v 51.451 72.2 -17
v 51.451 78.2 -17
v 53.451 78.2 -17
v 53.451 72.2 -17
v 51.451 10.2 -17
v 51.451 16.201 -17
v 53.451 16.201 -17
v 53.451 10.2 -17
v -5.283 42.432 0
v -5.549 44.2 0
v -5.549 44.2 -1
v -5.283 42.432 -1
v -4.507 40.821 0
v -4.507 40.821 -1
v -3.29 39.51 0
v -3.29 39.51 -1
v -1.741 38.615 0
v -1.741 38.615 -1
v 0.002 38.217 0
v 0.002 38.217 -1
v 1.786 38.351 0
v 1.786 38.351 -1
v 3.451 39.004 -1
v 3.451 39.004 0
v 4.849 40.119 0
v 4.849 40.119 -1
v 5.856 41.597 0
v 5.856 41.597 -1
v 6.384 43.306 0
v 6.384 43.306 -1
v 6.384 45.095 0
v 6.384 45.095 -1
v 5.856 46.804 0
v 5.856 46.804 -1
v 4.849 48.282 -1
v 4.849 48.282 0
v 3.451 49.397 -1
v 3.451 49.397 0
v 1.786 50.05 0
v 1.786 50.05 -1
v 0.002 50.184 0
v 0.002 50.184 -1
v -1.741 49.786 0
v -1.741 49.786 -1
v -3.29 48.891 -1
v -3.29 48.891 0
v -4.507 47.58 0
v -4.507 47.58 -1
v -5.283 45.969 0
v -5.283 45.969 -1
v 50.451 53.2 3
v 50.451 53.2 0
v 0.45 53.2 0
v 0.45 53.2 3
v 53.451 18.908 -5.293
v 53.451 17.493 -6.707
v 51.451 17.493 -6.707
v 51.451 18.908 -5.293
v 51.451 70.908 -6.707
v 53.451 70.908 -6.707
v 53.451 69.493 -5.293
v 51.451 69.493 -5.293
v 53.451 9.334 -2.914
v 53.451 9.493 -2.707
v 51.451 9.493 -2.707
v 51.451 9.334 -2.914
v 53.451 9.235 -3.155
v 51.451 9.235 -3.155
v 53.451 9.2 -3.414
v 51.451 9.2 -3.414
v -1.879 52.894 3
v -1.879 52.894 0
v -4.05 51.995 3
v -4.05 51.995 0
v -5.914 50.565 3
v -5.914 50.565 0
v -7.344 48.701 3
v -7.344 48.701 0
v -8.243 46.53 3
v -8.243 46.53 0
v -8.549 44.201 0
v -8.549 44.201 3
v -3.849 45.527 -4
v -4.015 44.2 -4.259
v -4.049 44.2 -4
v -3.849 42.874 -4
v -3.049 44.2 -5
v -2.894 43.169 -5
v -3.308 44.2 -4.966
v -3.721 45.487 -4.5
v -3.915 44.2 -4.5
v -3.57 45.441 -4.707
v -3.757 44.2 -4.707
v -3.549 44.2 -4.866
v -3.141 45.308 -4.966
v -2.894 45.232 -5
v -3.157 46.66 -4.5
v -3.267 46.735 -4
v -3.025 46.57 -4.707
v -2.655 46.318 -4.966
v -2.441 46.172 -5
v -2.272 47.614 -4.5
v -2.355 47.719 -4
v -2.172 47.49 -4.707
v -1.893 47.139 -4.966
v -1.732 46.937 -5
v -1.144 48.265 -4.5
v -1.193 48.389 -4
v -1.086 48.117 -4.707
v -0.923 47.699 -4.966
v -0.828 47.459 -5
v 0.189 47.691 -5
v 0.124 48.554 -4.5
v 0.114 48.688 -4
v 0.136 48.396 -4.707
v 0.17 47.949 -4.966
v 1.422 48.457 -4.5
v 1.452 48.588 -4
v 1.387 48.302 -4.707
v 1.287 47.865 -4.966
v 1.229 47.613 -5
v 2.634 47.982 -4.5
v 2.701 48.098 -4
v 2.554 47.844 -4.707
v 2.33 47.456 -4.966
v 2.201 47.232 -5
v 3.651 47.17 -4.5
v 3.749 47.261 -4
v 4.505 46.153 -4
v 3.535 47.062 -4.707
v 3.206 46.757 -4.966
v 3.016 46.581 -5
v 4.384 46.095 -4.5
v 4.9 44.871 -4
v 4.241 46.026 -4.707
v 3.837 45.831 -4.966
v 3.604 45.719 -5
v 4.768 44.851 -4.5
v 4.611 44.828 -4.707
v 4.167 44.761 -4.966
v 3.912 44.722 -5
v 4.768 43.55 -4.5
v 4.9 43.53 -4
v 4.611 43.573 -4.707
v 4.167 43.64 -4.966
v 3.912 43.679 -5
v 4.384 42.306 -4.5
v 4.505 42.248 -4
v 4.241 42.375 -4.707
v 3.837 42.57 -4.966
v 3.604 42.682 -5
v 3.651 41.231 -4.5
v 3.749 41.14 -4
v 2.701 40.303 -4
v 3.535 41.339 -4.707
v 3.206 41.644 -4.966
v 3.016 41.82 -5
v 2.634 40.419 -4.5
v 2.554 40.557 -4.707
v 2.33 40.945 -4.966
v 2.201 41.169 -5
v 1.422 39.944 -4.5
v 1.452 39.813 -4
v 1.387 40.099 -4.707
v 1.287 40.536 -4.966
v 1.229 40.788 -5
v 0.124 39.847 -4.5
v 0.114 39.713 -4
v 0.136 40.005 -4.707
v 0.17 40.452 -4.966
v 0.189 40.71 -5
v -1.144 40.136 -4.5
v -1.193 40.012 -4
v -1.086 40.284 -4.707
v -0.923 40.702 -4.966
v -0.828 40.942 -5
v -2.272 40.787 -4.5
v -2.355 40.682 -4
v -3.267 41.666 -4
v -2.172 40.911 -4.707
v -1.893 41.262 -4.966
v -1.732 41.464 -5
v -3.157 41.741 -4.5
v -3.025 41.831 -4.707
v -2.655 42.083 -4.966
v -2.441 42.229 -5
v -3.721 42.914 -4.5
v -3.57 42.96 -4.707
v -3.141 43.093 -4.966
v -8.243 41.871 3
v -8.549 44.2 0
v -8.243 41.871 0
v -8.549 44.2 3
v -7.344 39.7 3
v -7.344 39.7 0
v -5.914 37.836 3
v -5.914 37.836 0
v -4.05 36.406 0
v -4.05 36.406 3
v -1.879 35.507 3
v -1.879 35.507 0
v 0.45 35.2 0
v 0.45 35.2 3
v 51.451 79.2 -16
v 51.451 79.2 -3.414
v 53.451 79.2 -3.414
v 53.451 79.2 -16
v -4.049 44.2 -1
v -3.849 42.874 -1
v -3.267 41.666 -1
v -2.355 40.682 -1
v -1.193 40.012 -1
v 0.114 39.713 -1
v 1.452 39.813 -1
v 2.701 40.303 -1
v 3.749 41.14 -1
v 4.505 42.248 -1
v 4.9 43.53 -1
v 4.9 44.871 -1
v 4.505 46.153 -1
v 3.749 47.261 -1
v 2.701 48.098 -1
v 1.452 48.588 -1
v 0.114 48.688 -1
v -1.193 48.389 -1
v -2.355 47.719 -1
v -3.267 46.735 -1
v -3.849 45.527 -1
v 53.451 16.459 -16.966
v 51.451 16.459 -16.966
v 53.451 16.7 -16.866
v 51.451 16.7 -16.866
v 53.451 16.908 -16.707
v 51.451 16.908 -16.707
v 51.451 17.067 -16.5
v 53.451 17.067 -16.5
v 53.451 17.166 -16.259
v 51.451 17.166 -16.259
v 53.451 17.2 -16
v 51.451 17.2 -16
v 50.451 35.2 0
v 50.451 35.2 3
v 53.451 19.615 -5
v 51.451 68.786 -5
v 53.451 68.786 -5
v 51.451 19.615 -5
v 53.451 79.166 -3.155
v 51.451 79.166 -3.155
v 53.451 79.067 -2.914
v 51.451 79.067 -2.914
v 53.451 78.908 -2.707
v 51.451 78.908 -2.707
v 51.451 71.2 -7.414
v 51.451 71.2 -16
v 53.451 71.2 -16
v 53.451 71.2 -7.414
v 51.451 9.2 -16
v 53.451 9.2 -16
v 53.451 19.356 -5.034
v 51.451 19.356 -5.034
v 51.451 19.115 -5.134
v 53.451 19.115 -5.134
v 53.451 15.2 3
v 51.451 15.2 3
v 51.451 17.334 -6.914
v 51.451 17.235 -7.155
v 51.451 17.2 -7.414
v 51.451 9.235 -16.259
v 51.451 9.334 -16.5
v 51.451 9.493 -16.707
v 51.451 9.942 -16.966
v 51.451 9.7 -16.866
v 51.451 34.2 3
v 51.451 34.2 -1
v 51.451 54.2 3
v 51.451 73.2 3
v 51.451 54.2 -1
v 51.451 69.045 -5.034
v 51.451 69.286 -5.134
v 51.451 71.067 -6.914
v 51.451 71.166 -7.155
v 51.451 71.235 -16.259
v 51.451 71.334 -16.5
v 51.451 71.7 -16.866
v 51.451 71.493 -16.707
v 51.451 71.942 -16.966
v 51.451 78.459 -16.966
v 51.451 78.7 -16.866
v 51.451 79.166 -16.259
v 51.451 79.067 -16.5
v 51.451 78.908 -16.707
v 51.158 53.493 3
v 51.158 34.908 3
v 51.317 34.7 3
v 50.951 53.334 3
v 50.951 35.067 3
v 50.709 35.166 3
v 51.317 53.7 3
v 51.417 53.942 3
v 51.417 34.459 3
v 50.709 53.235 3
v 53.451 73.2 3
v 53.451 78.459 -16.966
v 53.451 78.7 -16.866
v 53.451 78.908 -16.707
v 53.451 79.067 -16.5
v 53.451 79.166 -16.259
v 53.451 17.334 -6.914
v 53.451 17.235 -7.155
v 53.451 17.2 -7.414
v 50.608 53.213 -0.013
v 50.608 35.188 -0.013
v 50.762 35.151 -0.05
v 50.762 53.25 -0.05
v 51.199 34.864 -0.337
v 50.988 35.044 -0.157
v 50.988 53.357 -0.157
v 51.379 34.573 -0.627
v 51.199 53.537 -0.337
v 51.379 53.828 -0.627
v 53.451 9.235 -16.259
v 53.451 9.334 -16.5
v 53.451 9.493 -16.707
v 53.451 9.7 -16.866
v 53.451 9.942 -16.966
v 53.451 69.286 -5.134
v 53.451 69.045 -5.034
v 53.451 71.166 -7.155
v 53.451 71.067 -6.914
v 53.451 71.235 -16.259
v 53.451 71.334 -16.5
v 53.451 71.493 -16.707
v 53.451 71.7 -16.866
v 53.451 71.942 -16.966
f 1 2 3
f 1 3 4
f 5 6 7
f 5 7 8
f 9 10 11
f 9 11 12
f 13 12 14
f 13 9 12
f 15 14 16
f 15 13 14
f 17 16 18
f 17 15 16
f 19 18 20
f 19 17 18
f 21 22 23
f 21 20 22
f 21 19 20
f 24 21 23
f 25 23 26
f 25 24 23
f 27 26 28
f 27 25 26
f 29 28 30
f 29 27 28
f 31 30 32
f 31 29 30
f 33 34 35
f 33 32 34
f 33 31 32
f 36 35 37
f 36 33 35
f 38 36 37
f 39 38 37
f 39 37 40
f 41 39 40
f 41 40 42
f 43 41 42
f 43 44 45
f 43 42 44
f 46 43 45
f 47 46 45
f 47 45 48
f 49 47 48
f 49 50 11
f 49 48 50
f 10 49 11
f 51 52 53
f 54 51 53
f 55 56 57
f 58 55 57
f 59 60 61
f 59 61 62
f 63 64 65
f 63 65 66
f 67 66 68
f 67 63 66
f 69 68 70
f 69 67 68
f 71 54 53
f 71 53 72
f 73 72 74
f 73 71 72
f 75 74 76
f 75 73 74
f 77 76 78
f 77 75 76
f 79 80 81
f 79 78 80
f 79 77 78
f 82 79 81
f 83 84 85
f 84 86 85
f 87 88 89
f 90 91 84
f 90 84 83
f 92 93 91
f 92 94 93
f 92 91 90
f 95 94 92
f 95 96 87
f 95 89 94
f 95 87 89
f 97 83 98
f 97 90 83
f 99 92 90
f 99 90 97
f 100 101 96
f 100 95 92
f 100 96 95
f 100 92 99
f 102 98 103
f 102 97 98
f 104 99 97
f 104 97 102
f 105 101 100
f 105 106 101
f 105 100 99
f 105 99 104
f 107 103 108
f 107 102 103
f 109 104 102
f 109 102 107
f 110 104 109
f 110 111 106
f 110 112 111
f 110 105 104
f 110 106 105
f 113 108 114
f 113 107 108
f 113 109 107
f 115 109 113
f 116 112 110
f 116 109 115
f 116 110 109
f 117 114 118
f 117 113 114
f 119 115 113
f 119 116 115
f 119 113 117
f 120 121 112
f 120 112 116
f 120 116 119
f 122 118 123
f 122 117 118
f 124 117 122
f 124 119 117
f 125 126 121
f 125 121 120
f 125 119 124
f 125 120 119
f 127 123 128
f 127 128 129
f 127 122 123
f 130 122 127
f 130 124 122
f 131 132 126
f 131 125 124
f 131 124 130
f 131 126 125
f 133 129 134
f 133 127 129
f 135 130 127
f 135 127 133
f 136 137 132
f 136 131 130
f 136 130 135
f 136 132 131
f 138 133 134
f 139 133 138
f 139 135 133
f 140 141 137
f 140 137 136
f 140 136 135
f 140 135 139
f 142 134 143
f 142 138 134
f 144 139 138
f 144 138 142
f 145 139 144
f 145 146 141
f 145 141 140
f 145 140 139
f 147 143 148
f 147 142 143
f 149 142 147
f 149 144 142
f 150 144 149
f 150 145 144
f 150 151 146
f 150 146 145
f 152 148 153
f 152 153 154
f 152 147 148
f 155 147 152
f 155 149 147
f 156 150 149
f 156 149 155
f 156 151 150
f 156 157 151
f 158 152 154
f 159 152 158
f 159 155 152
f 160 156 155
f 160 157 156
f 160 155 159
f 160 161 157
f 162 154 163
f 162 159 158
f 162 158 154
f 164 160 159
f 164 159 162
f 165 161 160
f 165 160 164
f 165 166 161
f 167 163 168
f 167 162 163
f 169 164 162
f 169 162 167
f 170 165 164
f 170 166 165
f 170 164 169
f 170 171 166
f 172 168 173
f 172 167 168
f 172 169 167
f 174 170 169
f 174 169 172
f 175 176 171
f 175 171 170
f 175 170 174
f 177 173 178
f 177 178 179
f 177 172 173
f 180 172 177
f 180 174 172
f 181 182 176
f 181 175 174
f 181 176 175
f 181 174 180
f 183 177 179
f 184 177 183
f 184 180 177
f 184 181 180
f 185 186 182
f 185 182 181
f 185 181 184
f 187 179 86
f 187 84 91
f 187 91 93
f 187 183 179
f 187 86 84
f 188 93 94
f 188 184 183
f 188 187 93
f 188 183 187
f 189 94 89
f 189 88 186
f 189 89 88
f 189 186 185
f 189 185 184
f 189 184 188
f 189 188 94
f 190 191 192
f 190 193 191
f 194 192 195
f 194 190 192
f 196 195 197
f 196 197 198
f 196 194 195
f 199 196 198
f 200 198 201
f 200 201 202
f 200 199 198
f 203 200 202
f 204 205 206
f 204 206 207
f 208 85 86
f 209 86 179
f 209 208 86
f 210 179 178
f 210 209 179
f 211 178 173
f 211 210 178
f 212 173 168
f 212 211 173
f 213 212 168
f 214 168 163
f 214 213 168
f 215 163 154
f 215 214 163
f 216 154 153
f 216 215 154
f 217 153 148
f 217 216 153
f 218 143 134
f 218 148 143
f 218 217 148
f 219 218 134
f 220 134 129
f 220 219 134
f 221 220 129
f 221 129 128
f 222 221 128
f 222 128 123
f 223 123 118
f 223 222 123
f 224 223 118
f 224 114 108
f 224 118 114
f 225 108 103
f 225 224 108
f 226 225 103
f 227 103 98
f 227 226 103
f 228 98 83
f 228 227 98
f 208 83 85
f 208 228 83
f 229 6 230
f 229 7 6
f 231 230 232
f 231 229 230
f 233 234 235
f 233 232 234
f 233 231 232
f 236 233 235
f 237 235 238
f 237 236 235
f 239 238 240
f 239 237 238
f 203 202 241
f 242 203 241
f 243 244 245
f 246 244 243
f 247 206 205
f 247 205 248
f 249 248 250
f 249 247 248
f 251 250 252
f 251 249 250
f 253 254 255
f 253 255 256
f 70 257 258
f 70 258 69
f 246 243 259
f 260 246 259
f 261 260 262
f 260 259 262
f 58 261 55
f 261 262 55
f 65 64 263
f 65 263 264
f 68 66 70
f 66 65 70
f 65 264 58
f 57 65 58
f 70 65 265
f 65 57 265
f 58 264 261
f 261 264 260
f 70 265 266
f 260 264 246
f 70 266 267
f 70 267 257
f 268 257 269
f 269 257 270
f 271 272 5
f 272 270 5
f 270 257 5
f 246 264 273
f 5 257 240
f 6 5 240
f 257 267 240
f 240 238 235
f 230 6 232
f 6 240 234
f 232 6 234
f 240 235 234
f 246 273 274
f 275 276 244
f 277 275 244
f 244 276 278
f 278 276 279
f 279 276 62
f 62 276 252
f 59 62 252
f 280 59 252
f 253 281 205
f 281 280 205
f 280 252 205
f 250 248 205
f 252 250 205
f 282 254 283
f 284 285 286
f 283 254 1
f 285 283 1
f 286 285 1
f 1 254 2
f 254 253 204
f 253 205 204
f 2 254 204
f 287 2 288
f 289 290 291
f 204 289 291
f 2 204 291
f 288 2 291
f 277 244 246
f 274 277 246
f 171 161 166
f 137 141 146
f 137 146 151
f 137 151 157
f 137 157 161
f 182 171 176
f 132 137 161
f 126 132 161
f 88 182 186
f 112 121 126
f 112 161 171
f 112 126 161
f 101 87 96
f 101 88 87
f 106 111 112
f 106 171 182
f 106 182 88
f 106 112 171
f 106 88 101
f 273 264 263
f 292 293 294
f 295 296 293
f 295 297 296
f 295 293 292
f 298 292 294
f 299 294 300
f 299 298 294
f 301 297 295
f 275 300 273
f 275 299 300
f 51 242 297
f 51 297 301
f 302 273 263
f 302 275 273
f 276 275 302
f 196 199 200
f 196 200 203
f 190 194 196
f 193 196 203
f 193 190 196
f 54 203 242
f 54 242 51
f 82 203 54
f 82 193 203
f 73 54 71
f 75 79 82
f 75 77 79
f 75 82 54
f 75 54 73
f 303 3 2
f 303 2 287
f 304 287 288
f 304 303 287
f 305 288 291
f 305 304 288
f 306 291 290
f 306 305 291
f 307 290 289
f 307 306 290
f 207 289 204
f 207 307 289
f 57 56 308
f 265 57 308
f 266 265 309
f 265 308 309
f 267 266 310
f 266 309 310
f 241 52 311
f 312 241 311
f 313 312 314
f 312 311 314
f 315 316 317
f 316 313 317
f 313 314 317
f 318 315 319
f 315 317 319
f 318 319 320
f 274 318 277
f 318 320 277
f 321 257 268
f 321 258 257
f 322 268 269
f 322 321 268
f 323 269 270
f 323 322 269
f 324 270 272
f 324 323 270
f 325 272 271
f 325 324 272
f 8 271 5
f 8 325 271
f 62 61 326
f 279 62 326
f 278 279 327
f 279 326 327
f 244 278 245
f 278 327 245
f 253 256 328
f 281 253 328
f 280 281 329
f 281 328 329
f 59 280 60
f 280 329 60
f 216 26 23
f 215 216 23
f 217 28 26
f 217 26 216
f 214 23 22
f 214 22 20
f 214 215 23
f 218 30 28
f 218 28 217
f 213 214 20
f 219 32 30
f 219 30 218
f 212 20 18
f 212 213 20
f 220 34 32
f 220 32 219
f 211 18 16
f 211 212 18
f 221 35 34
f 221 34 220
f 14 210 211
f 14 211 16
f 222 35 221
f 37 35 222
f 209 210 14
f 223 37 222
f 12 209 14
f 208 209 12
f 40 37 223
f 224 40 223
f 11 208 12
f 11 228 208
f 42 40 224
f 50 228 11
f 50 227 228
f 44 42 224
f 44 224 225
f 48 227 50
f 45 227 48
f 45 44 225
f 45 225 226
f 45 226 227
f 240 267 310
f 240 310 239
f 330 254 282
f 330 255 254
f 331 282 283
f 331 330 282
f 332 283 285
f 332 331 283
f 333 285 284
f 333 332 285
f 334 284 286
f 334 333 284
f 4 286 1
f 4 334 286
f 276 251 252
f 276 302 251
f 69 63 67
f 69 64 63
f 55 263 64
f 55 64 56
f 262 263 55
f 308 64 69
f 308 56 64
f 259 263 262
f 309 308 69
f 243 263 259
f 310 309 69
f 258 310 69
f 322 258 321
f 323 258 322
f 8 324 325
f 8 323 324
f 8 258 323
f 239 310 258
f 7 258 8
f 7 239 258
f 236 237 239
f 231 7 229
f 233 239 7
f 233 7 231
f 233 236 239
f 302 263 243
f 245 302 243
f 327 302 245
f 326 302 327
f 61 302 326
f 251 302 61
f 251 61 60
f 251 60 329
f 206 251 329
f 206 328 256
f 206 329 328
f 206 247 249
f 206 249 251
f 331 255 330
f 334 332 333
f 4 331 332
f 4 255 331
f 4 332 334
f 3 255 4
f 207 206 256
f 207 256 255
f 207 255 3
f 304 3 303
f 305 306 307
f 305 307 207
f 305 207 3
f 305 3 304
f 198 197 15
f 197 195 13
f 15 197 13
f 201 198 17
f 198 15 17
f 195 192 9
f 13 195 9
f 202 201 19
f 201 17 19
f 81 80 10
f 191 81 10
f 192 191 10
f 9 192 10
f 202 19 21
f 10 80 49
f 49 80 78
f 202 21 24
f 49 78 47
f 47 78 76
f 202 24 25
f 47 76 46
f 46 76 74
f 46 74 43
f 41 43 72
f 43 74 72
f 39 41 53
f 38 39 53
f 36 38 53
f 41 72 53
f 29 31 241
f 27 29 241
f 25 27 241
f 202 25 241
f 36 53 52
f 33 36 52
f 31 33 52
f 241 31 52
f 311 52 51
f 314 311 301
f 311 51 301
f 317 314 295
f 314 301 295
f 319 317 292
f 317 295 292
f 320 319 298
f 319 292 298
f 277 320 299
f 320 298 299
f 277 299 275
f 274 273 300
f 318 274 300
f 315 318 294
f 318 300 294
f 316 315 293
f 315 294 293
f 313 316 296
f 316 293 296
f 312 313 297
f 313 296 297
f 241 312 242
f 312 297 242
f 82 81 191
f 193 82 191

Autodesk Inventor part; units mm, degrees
ref_plane "YZ Plane" through (0, 0, 0) normal (1, 0, 0) x (0, 1, 0)
ref_plane "XZ Plane" through (0, 0, 0) normal (0, 1, 0) x (-1, 0, 0)
ref_plane "XY Plane" through (0, 0, 0) normal (0, 0, 1) x (1, 0, 0)
sketch "Sketch1" plane through (0, 0, 0) normal (0, 0, 1) x (1, 0, 0)
  line L0 (-8.5494, 35.2005) -> (51.4506, 35.2005)
  line L1 (51.4506, 35.2005) -> (51.4506, 53.2005)
  line L2 (51.4506, 53.2005) -> (-8.5494, 53.2005)
  line L3 (-8.5494, 53.2005) -> (-8.5494, 35.2005)
  point P0 (0, 0)
  dimension "d0" = 18
  dimension "d1" = 60
extrude "Extrusion1" add sketch "Sketch1" along normal blind 3
sketch "Sketch2" plane through (0, 0, 0) normal (0, 0, -1) x (-1, 0, 0)
  circle A0 centre (-0.4506, 44.2005) radius 4.5
  line L0 (-0.4506, 44.2005) -> (8.5494, 44.2005) construction
  line L1 (8.5494, 53.2005) -> (8.5494, 35.2005) projected
  line L2 (-0.4506, 44.2005) -> (-0.4506, 35.2005) construction
  line L3 (8.5494, 35.2005) -> (-51.4506, 35.2005) projected
  line L4 (-0.4506, 44.2005) -> (-0.4506, 53.2005) construction
  line L5 (-51.4506, 53.2005) -> (8.5494, 53.2005) projected
  point P0 (0, 0)
  dimension "d4" = 9
extrude "Extrusion2" add sketch "Sketch2" along normal blind 5
sketch "Sketch4" plane through (0.4506, 44.2005, -5) normal (0, 0, -1) x (-1, 0, 0)
  circle A0 centre (0, 0) radius 4.5 projected
  circle A1 centre (0, 0) radius 4
  line L0 (4, -3.1231) -> (4, 2.6998) construction
  point P0 (0.4506, -44.2005)
revolve "Revolution1" [suppressed]
sketch "Sketch5" plane through (0.2094, 44.2005, -3.3681) normal (-0.342, 0, -0.9397) x (-0.9397, 0, 0.342)
  ellipse E0 centre (0, 0) end of major axis (0, -4) minor radius 4
  point P0 (1.3487, -44.2005)
extrude "Extrusion3" [suppressed]
fillet "Fillet1" radius 9 2 edges at (-8.5494, 35.2005, 1.5) (-8.5494, 53.2005, 1.5)
sketch "Sketch6" plane through (51.4506, 35.2005, 0) normal (1, 0, 0) x (0, 0, -1)
  line L0 (-3, 44) -> (17, 44)
  line L1 (17, -26) -> (-3, -26)
  line L2 (-3, -26) -> (-3, 44)
  line L3 (-3, 0) -> (-3, 18) projected
  line L4 (0, 0) -> (-3, 0) projected
  line L5 (0, 0) -> (-3, -26) construction
  line L6 (0, 18) -> (-3, 18) projected
  line L7 (0, 18) -> (-3, 44) construction
  line L8 (17, 44) -> (17, 36)
  line L9 (17, 36) -> (5, 36)
  line L10 (5, 36) -> (5, -18)
  line L11 (5, -18) -> (17, -18)
  line L12 (17, -18) -> (17, -26)
  point P0 (0, -35.2005)
  dimension "d11" = 70
  dimension "d12" = 0
  dimension "d15" = 20
  dimension "d16" = 8
  dimension "d17" = 8
  dimension "d18" = 8
  dimension "d19" = 20
extrude "Extrusion4" add sketch "Sketch6" along normal blind 2
chamfer "Chamfer1" distance 6 angle 45 2 edges at (52.4506, 79.2005, 3) (52.4506, 9.2005, 3)
chamfer "Chamfer2" distance 2 angle 45 2 edges at (52.4506, 17.2005, -5) (52.4506, 71.2005, -5)
fillet "Fillet3" radius 1 13 edges at (52.4506, 17.2005, -17) (52.4506, 9.2005, -17) (52.4506, 79.2005, -17) (52.4506, 71.2005, -17) (52.4506, 71.2005, -7) (52.4506, 69.2005, -5) (52.4506, 19.2005, -5) (52.4506, 17.2005, -7) (52.4506, 79.2005, -3) (52.4506, 9.2005, -3) (51.4506, 53.2005, 1.5) (51.4506, 44.2005, 0) (51.4506, 35.2005, 1.5)
fillet "Fillet4" radius 1 1 edges at (4.9506, 44.2005, -5)
sketch "Sketch7" plane through (0, 0, 0) normal (0, 0, -1) x (-1, 0, 0)
  circle A0 centre (-0.4506, 44.2005) radius 4.5 projected
  circle A1 centre (-0.4506, 44.2005) radius 6
  point P0 (0, 0)
  dimension "d29" = 12
extrude "Extrusion5" add sketch "Sketch7" along normal blind 1 contours A0 | A1
equation "\"d17\" = d16"
equation "\"d18\" = d16"
equation "\"d19\" = d15"
properties part number "Holder"
